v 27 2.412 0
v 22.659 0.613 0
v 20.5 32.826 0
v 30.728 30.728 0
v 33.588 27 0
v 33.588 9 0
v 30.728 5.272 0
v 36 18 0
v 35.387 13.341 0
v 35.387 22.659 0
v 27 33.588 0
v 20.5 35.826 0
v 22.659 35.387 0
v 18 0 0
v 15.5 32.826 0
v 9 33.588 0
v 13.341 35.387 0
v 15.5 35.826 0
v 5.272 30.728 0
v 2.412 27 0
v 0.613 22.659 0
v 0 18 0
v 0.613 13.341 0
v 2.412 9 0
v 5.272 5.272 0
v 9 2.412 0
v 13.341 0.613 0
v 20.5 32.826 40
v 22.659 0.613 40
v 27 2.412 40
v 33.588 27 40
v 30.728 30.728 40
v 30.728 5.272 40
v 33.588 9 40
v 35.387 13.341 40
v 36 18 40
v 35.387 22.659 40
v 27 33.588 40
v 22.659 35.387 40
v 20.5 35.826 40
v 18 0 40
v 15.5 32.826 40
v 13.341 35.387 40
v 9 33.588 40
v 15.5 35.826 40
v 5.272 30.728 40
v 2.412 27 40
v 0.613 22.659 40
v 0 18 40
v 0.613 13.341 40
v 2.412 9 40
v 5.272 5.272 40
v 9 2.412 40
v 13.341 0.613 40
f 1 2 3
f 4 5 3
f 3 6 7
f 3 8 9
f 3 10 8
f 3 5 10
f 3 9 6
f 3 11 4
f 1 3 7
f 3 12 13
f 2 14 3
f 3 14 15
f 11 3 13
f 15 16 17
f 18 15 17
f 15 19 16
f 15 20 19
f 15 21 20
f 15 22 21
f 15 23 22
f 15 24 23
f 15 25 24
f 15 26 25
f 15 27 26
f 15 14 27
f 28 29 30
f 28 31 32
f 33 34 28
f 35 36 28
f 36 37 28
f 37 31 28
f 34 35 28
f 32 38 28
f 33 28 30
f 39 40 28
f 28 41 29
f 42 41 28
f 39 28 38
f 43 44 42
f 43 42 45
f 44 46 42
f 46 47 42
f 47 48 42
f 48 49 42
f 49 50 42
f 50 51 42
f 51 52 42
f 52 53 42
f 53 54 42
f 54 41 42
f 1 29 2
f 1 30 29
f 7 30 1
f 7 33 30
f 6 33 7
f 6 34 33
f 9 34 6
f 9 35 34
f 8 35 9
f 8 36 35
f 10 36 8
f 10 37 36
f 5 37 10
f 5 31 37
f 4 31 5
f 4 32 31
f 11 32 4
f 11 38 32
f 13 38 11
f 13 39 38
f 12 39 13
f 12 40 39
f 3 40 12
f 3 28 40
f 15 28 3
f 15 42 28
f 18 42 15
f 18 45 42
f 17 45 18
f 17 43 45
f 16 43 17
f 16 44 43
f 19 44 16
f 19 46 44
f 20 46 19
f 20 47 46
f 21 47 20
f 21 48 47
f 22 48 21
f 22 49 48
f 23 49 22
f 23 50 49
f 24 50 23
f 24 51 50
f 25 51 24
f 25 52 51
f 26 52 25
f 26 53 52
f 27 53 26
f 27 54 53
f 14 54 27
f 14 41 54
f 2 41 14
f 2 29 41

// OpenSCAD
$fn = 32;

// ----------------------------------------------------------------------
// Keyway shaft: d36 shaft, key 5 x 3 mm
// ----------------------------------------------------------------------

// --- parameters (mm) ---
shaft_r = 18;             // shaft radius
key_w = 5;                // keyway width
key_d = 3;                // keyway depth below the surface line
plate_t = 40;             // shaft length, Z (extrusion height)

shaft_d = 2 * shaft_r;  // shaft diameter
circle_step = 15;  // polygon sampling step, degrees

profile = [[13.341, 35.387], [9, 33.588], [5.272, 30.728], [2.412, 27], [0.613, 22.659], [0, 18], [0.613, 13.341], [2.412, 9], [5.272, 5.272], [9, 2.412], [13.341, 0.613], [18, 0], [22.659, 0.613], [27, 2.412], [30.728, 5.272], [33.588, 9], [35.387, 13.341], [36, 18], [35.387, 22.659], [33.588, 27], [30.728, 30.728], [27, 33.588], [22.659, 35.387], [20.5, 35.826], [20.5, 32.826], [15.5, 32.826], [15.5, 35.826]];  // primary outline, 27 points, counter clockwise

// --- the one profile operation ---
linear_extrude(height = plate_t) polygon(points = profile);
